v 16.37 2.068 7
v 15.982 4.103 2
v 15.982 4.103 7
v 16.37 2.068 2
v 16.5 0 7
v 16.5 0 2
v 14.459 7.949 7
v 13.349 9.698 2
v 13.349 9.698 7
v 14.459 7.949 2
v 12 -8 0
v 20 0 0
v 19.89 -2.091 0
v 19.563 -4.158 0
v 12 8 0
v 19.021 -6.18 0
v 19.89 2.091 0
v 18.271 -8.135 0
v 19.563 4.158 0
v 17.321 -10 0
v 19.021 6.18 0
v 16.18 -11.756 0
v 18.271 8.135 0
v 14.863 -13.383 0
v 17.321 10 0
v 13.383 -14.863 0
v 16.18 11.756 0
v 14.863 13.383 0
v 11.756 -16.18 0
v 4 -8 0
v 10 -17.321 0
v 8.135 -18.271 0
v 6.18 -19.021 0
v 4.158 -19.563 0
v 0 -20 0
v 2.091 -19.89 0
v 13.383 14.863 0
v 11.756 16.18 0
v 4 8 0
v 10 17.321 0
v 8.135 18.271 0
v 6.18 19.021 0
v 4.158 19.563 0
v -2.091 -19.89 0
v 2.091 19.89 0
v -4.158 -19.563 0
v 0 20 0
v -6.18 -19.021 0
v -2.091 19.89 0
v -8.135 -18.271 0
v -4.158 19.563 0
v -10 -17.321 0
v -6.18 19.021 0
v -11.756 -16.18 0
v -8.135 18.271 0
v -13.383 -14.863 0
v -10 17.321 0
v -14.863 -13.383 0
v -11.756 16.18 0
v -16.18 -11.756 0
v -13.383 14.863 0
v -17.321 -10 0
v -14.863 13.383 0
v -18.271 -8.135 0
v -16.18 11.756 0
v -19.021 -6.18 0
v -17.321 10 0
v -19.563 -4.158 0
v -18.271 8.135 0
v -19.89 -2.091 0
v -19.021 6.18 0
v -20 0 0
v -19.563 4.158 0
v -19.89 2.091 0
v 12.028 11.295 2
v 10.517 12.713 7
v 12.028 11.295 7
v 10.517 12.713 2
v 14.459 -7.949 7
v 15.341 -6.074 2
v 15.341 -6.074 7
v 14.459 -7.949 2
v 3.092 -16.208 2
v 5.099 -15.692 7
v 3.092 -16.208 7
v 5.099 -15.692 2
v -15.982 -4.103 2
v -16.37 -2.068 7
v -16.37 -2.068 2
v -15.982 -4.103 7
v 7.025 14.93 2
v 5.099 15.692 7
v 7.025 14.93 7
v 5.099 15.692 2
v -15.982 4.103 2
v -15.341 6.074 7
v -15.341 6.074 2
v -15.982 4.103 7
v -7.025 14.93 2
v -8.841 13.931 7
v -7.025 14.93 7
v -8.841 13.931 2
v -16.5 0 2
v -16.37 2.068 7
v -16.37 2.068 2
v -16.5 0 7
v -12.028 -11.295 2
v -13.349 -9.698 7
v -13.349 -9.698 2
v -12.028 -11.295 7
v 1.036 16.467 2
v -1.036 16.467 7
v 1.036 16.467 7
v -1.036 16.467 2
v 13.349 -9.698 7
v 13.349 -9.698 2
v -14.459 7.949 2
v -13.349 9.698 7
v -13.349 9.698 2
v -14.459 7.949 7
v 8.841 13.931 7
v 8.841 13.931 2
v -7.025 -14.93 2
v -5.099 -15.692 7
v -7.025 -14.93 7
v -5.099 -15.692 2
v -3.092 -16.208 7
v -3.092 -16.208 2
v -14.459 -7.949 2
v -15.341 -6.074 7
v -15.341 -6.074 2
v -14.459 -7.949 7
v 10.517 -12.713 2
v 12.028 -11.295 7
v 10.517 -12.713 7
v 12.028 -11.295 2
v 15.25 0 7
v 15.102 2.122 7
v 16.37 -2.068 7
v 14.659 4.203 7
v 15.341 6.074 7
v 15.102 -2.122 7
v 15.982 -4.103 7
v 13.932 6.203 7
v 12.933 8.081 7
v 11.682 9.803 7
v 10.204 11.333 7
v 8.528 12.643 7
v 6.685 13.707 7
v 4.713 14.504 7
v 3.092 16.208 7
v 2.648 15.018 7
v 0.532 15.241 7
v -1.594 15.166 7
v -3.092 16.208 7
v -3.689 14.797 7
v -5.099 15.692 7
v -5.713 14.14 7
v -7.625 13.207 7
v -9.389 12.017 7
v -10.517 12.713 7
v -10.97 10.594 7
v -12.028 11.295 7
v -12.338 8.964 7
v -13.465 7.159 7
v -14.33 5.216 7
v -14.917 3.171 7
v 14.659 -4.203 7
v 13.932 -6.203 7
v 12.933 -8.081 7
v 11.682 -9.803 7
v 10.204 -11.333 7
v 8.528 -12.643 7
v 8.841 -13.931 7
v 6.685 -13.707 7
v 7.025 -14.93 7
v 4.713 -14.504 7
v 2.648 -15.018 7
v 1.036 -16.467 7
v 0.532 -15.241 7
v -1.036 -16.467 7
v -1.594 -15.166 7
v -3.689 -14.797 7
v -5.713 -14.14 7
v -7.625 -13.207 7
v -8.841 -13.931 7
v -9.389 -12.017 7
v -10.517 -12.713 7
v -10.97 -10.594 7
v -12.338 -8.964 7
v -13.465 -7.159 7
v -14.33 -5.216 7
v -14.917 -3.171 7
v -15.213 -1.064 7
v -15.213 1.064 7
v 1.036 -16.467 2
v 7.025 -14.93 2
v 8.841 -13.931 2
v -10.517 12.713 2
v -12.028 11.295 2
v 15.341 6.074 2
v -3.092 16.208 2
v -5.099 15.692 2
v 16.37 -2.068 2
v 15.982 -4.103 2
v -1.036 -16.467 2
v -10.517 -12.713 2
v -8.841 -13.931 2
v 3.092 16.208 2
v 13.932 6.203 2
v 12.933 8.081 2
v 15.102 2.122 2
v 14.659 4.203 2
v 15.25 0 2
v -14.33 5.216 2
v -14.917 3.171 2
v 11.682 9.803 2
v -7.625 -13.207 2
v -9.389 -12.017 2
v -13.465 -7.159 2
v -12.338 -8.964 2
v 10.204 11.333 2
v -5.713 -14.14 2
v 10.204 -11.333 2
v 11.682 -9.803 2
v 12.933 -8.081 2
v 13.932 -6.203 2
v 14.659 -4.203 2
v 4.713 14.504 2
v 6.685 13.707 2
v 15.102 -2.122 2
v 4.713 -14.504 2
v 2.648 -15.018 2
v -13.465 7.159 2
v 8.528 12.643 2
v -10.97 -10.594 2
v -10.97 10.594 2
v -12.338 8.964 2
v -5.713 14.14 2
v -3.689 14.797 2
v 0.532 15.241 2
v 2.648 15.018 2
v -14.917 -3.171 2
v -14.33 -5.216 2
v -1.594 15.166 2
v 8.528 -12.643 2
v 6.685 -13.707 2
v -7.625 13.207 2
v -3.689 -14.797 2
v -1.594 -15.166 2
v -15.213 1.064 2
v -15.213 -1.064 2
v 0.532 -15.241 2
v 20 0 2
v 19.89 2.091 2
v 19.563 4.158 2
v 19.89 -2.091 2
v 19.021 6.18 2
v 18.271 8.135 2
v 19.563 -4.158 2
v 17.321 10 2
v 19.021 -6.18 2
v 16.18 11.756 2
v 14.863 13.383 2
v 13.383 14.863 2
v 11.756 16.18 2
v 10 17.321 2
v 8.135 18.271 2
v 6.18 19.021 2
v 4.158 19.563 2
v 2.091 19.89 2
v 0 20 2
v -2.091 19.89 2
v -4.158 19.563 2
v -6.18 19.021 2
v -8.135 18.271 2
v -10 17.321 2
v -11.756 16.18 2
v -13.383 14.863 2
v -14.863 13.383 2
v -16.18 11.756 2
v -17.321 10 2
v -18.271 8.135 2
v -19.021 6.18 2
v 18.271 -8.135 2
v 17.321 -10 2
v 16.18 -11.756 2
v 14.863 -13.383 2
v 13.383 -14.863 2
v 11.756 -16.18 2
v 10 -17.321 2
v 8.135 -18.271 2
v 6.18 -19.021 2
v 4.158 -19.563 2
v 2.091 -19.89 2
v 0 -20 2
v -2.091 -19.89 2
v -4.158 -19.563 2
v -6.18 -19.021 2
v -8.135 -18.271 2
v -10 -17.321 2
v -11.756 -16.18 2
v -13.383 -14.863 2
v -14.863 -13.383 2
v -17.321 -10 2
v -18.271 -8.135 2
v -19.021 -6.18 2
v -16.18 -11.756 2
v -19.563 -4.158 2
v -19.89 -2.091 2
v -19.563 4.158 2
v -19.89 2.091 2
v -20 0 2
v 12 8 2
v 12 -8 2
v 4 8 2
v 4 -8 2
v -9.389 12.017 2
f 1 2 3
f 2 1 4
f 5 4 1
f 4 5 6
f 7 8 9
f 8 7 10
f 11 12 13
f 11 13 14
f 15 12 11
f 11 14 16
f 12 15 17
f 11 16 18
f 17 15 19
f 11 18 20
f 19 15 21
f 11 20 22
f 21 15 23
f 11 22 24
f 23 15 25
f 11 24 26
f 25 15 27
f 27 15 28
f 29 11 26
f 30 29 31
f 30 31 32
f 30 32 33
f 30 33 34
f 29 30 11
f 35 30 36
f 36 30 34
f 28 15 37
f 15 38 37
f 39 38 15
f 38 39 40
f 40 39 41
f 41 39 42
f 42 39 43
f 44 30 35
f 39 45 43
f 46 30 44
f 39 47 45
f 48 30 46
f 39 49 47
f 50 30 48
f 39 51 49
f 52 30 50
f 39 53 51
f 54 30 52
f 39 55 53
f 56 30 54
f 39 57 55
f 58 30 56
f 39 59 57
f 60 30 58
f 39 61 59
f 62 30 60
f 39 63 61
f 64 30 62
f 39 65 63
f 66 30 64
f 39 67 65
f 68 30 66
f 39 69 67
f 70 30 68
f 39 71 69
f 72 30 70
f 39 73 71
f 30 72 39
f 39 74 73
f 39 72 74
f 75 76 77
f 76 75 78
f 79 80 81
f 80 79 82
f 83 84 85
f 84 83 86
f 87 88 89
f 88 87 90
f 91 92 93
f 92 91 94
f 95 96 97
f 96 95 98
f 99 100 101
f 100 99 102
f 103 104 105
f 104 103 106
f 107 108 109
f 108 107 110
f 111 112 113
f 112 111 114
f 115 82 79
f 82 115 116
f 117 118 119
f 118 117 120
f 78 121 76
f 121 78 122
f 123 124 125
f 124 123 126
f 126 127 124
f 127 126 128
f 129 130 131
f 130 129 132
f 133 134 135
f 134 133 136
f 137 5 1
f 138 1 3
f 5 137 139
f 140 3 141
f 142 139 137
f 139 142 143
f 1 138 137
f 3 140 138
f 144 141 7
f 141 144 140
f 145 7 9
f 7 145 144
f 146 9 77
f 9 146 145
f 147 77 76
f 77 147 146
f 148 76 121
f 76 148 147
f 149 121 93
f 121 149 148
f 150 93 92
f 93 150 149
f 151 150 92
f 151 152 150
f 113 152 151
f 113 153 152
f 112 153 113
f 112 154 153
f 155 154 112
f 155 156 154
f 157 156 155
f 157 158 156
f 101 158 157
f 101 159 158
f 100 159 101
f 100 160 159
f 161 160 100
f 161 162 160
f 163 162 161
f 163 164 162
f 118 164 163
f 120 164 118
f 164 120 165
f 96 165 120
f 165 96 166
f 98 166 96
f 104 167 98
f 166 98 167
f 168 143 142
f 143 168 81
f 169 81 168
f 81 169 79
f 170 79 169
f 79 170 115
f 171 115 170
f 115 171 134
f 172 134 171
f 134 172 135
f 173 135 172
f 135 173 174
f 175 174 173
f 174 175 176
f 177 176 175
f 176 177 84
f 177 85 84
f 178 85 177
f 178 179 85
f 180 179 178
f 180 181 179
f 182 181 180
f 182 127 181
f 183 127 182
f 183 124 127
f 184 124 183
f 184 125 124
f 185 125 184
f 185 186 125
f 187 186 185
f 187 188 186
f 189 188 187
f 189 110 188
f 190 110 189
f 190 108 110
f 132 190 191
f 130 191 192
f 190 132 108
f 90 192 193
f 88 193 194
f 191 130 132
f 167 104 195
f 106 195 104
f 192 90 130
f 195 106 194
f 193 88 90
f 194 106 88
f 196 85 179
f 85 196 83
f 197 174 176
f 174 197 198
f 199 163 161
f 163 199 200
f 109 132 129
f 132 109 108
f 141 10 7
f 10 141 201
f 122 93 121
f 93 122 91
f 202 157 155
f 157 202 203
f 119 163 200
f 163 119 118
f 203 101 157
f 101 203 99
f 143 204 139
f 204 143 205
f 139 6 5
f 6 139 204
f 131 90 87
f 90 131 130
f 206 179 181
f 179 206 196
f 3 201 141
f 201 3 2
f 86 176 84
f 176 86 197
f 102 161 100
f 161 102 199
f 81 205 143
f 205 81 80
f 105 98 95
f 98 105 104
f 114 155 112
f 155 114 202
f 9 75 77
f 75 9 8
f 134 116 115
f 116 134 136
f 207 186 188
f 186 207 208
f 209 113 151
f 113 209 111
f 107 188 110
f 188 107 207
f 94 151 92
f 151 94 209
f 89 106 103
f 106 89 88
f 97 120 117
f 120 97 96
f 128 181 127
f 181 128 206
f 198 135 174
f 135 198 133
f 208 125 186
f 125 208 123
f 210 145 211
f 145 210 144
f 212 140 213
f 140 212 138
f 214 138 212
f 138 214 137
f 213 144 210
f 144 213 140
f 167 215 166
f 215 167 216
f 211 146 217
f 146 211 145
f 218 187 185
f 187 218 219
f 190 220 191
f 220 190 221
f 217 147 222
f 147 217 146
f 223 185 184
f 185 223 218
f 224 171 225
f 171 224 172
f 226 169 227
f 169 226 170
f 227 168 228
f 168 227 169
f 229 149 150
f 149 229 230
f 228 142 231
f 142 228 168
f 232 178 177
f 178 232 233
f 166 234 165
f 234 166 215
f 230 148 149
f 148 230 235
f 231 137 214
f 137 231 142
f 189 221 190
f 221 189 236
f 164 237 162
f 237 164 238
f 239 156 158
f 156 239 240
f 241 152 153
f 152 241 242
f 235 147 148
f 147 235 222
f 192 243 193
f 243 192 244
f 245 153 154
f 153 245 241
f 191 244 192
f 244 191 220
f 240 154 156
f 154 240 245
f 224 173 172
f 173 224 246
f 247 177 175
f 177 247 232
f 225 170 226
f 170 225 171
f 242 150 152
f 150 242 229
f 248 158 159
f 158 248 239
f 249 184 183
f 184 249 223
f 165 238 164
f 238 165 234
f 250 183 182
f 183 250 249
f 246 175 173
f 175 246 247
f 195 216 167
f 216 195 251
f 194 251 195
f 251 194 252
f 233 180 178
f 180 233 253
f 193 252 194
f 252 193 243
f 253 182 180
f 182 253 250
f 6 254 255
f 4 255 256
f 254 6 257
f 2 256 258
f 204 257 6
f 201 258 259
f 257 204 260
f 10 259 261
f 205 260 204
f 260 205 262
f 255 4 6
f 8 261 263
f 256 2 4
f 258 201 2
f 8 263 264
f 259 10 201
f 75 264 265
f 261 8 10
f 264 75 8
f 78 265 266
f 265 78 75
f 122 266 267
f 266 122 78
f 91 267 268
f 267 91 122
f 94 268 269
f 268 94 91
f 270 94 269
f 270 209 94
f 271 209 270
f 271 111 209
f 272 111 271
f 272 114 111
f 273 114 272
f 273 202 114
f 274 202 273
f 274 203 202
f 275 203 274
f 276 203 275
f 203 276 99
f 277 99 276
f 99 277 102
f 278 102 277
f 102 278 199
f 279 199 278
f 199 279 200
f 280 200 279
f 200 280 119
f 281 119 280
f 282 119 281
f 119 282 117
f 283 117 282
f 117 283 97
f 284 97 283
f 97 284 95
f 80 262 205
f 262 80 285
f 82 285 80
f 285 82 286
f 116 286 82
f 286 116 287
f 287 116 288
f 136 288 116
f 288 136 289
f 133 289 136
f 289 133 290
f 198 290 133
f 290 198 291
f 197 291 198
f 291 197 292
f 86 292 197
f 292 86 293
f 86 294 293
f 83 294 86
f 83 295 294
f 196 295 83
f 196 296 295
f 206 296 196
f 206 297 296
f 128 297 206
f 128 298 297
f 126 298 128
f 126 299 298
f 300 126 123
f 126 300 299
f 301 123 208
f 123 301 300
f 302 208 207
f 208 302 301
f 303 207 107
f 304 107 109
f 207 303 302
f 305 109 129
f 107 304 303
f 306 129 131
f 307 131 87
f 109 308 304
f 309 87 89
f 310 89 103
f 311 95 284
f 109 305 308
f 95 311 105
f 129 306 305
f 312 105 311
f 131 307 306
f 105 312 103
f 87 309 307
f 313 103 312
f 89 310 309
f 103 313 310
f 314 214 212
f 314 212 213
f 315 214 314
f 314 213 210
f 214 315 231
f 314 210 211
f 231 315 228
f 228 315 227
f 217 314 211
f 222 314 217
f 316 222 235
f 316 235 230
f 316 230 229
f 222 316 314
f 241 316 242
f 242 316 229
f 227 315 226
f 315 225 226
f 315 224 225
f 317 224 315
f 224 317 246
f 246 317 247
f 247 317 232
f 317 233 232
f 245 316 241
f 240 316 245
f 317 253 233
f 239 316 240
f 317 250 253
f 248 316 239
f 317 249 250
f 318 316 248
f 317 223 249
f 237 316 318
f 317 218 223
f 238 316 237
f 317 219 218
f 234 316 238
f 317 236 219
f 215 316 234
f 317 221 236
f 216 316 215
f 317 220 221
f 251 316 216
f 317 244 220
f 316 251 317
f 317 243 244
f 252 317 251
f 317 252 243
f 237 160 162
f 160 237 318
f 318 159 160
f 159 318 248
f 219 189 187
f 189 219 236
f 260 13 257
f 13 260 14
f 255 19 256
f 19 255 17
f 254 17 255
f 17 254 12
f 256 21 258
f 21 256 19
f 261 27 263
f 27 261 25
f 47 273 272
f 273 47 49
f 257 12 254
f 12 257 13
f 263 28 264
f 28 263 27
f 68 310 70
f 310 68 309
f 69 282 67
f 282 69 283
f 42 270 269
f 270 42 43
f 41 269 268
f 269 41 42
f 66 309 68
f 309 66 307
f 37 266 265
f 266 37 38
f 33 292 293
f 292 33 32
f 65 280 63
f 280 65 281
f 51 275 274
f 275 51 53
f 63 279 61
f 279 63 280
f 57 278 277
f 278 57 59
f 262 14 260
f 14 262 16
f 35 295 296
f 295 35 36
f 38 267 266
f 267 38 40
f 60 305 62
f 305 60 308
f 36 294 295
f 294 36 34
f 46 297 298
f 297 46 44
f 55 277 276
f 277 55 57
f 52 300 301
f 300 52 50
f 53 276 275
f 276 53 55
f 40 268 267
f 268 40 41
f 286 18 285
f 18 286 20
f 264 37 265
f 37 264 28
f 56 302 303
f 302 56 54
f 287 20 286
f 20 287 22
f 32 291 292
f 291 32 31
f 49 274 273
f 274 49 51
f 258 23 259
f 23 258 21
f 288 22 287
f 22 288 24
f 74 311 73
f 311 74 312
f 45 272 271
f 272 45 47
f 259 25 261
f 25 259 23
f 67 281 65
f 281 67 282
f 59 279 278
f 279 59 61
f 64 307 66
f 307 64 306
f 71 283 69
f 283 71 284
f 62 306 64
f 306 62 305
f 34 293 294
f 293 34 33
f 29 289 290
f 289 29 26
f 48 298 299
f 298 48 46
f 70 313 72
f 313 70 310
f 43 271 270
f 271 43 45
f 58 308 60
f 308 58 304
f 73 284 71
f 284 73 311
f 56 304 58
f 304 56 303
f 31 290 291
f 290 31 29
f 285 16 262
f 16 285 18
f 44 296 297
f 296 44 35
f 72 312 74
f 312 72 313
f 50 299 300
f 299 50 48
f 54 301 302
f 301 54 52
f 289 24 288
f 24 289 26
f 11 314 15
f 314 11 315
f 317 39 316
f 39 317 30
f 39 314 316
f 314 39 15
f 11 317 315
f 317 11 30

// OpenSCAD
difference() {
    union() {
    cylinder(h=2, r1=20, r2=20, $fn=60);
    difference() {
        cylinder(h=7, r1=16.5, r2=16.5, $fn=50);
        translate([0,0,2]) cylinder(h=7, r1=15.25, r2=15.25, $fn=45);
    }
    }
    translate([4,-8,-2]) cube([8,16,10]);
}
